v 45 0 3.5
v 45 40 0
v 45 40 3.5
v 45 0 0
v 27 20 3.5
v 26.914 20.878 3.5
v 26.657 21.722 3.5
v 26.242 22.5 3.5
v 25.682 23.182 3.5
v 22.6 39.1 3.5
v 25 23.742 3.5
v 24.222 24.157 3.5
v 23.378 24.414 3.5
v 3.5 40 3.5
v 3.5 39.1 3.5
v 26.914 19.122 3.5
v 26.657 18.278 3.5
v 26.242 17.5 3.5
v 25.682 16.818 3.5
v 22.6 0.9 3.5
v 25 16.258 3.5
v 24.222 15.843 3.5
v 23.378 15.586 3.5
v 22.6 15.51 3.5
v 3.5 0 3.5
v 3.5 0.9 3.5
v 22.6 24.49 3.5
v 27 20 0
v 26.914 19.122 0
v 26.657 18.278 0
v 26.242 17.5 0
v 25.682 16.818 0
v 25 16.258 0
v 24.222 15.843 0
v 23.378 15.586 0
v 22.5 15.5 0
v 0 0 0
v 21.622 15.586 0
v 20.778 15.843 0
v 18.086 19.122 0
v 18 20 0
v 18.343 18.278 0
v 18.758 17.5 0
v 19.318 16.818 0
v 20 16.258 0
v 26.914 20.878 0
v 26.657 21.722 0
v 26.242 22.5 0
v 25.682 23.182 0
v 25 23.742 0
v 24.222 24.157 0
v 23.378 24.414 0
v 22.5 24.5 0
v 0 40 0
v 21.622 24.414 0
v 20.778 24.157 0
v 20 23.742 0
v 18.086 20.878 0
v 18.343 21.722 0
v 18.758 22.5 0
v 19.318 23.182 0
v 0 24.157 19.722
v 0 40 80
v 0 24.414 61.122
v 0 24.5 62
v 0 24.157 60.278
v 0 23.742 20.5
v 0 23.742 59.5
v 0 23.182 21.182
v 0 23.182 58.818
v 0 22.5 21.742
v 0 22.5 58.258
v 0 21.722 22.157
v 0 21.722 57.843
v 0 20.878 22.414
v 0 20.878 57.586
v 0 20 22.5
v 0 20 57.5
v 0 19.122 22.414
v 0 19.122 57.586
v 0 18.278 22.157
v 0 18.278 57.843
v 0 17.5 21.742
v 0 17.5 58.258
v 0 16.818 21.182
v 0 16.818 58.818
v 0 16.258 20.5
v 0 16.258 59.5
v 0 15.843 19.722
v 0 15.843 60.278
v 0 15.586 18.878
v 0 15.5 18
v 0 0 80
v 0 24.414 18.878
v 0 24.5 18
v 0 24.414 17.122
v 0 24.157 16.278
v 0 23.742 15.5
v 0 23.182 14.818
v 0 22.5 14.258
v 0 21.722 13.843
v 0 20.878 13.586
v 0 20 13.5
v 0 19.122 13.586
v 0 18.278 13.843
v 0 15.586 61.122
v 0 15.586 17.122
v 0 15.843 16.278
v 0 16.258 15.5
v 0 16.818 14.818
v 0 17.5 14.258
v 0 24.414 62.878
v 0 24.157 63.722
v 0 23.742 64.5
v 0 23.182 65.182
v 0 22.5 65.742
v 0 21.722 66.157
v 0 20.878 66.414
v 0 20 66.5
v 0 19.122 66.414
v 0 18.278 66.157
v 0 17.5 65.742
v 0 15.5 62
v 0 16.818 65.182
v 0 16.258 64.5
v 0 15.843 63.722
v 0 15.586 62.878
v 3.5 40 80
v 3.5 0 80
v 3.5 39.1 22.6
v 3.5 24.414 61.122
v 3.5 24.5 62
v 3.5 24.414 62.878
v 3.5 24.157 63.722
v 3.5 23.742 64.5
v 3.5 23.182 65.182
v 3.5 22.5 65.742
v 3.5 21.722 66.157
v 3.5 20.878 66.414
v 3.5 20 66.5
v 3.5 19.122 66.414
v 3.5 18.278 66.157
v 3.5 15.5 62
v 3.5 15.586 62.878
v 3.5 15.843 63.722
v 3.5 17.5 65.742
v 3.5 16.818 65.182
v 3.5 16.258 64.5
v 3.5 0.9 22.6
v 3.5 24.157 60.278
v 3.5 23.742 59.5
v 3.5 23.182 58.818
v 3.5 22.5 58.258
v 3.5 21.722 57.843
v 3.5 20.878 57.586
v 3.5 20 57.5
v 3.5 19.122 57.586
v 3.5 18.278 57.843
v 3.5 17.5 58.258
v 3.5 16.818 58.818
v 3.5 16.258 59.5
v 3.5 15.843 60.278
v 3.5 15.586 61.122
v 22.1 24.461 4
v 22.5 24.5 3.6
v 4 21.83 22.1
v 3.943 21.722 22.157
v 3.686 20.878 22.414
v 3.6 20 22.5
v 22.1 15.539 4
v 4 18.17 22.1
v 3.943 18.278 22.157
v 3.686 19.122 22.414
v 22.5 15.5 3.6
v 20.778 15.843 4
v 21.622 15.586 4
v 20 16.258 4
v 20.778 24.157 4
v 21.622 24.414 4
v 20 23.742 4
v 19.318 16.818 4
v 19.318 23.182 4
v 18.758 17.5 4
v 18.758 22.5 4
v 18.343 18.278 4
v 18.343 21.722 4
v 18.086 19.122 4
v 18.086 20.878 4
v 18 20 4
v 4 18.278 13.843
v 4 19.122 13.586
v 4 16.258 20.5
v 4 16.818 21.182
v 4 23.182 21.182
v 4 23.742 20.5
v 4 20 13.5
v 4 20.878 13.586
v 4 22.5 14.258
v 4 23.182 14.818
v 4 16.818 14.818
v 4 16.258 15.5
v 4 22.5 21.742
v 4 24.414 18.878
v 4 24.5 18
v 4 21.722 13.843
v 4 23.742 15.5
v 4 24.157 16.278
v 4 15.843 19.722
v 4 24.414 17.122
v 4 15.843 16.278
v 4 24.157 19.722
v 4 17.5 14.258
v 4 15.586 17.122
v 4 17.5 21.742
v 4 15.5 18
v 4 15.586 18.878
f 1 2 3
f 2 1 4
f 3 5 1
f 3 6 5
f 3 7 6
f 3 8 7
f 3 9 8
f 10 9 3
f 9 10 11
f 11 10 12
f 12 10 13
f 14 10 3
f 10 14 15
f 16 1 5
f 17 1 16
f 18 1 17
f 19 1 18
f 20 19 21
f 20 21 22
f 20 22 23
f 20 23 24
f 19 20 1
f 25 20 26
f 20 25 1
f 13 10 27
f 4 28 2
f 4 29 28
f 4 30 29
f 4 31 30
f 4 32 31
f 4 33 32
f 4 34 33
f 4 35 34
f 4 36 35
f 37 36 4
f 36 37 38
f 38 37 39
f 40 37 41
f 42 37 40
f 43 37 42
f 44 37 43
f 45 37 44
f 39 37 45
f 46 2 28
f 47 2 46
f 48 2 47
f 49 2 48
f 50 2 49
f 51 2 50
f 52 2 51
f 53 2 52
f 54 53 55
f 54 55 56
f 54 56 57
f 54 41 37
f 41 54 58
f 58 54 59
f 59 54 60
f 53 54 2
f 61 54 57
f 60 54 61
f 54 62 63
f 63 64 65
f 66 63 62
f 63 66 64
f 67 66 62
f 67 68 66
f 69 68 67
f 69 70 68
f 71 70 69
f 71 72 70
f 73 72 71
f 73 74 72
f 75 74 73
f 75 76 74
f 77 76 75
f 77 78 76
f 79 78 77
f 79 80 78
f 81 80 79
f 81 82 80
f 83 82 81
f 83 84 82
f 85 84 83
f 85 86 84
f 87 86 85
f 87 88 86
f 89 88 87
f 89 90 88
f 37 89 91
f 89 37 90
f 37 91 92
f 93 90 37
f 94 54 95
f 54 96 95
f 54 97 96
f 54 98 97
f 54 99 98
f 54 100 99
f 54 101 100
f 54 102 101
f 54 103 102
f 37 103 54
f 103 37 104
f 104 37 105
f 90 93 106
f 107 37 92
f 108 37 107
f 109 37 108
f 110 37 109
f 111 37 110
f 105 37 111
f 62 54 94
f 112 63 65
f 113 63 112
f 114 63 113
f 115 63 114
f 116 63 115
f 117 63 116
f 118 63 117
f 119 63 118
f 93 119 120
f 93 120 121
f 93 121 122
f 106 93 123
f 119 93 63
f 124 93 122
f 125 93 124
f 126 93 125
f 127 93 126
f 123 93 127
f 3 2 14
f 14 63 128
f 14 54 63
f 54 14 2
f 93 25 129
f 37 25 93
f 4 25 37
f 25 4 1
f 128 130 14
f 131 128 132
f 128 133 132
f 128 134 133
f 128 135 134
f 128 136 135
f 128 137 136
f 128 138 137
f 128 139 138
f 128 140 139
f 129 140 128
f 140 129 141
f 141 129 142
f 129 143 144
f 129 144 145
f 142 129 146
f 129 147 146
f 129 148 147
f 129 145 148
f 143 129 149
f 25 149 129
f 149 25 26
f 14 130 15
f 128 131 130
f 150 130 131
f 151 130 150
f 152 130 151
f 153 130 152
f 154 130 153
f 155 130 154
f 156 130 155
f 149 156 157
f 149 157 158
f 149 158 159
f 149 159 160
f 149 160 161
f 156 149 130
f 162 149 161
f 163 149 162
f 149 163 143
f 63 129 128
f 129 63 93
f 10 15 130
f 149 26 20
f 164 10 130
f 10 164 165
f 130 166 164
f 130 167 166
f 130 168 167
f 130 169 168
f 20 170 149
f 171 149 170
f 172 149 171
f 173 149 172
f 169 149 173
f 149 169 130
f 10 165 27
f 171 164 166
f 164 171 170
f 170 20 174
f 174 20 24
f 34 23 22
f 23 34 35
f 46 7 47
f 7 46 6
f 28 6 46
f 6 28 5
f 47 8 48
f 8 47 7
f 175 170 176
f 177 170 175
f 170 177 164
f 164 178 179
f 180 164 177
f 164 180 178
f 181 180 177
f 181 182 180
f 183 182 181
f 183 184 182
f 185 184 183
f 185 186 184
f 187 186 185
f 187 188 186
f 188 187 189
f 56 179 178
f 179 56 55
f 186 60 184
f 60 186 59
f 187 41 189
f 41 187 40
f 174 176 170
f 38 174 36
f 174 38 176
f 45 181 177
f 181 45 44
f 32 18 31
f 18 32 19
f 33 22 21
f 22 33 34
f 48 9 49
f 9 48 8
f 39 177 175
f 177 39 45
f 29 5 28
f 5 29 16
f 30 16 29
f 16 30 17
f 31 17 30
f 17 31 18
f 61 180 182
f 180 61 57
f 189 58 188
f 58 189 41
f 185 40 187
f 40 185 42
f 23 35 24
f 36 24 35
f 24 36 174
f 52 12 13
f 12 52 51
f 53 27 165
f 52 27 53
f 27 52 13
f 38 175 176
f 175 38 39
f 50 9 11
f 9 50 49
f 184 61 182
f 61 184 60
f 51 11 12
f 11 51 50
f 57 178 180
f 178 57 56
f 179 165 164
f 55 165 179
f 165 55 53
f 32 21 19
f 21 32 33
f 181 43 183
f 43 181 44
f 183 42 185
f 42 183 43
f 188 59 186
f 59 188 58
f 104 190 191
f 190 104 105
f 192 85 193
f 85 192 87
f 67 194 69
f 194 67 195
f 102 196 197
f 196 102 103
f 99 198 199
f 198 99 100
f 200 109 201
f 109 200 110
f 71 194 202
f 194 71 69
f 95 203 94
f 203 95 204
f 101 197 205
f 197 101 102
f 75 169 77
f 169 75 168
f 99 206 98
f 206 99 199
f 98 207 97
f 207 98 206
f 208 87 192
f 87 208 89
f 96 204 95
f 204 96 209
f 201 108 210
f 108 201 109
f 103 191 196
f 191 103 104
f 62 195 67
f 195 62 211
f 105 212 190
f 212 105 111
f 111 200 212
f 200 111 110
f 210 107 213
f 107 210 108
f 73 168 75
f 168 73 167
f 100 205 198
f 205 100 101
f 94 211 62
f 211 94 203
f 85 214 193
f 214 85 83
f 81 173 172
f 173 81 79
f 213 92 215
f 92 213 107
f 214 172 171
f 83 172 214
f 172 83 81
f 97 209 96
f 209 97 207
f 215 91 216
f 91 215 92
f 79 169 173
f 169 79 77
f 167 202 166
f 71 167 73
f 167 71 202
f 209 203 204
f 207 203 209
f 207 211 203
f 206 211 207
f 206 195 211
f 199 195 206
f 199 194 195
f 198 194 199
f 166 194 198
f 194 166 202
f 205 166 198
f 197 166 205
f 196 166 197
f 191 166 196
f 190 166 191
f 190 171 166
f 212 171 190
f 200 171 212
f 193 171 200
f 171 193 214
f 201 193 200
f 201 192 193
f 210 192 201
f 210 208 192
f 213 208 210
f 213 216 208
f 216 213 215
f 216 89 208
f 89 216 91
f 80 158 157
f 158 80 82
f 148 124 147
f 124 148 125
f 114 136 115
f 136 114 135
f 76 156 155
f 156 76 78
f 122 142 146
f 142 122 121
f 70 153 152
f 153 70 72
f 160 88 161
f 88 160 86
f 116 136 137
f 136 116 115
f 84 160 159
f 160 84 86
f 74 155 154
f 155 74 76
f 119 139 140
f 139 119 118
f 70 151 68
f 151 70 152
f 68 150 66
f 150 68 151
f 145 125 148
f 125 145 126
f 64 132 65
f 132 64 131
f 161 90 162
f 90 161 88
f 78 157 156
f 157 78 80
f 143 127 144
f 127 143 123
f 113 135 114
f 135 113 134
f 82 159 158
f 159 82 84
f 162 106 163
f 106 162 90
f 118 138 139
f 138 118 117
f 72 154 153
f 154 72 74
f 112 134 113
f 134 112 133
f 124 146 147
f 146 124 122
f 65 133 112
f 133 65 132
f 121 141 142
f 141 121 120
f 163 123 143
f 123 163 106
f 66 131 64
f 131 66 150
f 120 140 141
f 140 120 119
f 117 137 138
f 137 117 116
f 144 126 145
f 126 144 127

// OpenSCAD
$fn = 32;

// ----------------------------------------------------------------------
// L-bracket: 45 x 40 x 80 mm
// ----------------------------------------------------------------------

// --- parameters (mm) ---
arm_x = 45;               // horizontal leg, X
arm_z = 80;               // vertical leg, Z
width = 40;               // bracket depth, Y
wall = 3.5;               // plate thickness
hole_d = 9;               // clearance for M8
rib_leg = 25.2;           // gusset leg
rib_sink = 0.9;           // gusset overlap into the plates

module hole_z(px, py) {
  translate([px, py, -0.5]) cylinder(h = wall + 1, d = hole_d);
}
module hole_x(pz, py) {
  translate([-0.5, py, pz]) rotate([0, 90, 0]) cylinder(h = wall + 1, d = hole_d);
}
module gusset() {
  translate([0, width - rib_sink, 0])
    rotate([90, 0, 0])
      linear_extrude(height = width - 2 * rib_sink)
        polygon(points = [[rib_sink, rib_sink], [rib_leg, rib_sink], [rib_sink, rib_leg]]);
}

difference() {
  union() {
    /* horizontal leg */
    cube([arm_x, width, wall]);
    /* vertical leg, overlapping the corner block */
    cube([wall, width, arm_z]);
    gusset();
  }
  hole_z(22.5, 20);
  hole_x(18, 20);
  hole_x(62, 20);
}
